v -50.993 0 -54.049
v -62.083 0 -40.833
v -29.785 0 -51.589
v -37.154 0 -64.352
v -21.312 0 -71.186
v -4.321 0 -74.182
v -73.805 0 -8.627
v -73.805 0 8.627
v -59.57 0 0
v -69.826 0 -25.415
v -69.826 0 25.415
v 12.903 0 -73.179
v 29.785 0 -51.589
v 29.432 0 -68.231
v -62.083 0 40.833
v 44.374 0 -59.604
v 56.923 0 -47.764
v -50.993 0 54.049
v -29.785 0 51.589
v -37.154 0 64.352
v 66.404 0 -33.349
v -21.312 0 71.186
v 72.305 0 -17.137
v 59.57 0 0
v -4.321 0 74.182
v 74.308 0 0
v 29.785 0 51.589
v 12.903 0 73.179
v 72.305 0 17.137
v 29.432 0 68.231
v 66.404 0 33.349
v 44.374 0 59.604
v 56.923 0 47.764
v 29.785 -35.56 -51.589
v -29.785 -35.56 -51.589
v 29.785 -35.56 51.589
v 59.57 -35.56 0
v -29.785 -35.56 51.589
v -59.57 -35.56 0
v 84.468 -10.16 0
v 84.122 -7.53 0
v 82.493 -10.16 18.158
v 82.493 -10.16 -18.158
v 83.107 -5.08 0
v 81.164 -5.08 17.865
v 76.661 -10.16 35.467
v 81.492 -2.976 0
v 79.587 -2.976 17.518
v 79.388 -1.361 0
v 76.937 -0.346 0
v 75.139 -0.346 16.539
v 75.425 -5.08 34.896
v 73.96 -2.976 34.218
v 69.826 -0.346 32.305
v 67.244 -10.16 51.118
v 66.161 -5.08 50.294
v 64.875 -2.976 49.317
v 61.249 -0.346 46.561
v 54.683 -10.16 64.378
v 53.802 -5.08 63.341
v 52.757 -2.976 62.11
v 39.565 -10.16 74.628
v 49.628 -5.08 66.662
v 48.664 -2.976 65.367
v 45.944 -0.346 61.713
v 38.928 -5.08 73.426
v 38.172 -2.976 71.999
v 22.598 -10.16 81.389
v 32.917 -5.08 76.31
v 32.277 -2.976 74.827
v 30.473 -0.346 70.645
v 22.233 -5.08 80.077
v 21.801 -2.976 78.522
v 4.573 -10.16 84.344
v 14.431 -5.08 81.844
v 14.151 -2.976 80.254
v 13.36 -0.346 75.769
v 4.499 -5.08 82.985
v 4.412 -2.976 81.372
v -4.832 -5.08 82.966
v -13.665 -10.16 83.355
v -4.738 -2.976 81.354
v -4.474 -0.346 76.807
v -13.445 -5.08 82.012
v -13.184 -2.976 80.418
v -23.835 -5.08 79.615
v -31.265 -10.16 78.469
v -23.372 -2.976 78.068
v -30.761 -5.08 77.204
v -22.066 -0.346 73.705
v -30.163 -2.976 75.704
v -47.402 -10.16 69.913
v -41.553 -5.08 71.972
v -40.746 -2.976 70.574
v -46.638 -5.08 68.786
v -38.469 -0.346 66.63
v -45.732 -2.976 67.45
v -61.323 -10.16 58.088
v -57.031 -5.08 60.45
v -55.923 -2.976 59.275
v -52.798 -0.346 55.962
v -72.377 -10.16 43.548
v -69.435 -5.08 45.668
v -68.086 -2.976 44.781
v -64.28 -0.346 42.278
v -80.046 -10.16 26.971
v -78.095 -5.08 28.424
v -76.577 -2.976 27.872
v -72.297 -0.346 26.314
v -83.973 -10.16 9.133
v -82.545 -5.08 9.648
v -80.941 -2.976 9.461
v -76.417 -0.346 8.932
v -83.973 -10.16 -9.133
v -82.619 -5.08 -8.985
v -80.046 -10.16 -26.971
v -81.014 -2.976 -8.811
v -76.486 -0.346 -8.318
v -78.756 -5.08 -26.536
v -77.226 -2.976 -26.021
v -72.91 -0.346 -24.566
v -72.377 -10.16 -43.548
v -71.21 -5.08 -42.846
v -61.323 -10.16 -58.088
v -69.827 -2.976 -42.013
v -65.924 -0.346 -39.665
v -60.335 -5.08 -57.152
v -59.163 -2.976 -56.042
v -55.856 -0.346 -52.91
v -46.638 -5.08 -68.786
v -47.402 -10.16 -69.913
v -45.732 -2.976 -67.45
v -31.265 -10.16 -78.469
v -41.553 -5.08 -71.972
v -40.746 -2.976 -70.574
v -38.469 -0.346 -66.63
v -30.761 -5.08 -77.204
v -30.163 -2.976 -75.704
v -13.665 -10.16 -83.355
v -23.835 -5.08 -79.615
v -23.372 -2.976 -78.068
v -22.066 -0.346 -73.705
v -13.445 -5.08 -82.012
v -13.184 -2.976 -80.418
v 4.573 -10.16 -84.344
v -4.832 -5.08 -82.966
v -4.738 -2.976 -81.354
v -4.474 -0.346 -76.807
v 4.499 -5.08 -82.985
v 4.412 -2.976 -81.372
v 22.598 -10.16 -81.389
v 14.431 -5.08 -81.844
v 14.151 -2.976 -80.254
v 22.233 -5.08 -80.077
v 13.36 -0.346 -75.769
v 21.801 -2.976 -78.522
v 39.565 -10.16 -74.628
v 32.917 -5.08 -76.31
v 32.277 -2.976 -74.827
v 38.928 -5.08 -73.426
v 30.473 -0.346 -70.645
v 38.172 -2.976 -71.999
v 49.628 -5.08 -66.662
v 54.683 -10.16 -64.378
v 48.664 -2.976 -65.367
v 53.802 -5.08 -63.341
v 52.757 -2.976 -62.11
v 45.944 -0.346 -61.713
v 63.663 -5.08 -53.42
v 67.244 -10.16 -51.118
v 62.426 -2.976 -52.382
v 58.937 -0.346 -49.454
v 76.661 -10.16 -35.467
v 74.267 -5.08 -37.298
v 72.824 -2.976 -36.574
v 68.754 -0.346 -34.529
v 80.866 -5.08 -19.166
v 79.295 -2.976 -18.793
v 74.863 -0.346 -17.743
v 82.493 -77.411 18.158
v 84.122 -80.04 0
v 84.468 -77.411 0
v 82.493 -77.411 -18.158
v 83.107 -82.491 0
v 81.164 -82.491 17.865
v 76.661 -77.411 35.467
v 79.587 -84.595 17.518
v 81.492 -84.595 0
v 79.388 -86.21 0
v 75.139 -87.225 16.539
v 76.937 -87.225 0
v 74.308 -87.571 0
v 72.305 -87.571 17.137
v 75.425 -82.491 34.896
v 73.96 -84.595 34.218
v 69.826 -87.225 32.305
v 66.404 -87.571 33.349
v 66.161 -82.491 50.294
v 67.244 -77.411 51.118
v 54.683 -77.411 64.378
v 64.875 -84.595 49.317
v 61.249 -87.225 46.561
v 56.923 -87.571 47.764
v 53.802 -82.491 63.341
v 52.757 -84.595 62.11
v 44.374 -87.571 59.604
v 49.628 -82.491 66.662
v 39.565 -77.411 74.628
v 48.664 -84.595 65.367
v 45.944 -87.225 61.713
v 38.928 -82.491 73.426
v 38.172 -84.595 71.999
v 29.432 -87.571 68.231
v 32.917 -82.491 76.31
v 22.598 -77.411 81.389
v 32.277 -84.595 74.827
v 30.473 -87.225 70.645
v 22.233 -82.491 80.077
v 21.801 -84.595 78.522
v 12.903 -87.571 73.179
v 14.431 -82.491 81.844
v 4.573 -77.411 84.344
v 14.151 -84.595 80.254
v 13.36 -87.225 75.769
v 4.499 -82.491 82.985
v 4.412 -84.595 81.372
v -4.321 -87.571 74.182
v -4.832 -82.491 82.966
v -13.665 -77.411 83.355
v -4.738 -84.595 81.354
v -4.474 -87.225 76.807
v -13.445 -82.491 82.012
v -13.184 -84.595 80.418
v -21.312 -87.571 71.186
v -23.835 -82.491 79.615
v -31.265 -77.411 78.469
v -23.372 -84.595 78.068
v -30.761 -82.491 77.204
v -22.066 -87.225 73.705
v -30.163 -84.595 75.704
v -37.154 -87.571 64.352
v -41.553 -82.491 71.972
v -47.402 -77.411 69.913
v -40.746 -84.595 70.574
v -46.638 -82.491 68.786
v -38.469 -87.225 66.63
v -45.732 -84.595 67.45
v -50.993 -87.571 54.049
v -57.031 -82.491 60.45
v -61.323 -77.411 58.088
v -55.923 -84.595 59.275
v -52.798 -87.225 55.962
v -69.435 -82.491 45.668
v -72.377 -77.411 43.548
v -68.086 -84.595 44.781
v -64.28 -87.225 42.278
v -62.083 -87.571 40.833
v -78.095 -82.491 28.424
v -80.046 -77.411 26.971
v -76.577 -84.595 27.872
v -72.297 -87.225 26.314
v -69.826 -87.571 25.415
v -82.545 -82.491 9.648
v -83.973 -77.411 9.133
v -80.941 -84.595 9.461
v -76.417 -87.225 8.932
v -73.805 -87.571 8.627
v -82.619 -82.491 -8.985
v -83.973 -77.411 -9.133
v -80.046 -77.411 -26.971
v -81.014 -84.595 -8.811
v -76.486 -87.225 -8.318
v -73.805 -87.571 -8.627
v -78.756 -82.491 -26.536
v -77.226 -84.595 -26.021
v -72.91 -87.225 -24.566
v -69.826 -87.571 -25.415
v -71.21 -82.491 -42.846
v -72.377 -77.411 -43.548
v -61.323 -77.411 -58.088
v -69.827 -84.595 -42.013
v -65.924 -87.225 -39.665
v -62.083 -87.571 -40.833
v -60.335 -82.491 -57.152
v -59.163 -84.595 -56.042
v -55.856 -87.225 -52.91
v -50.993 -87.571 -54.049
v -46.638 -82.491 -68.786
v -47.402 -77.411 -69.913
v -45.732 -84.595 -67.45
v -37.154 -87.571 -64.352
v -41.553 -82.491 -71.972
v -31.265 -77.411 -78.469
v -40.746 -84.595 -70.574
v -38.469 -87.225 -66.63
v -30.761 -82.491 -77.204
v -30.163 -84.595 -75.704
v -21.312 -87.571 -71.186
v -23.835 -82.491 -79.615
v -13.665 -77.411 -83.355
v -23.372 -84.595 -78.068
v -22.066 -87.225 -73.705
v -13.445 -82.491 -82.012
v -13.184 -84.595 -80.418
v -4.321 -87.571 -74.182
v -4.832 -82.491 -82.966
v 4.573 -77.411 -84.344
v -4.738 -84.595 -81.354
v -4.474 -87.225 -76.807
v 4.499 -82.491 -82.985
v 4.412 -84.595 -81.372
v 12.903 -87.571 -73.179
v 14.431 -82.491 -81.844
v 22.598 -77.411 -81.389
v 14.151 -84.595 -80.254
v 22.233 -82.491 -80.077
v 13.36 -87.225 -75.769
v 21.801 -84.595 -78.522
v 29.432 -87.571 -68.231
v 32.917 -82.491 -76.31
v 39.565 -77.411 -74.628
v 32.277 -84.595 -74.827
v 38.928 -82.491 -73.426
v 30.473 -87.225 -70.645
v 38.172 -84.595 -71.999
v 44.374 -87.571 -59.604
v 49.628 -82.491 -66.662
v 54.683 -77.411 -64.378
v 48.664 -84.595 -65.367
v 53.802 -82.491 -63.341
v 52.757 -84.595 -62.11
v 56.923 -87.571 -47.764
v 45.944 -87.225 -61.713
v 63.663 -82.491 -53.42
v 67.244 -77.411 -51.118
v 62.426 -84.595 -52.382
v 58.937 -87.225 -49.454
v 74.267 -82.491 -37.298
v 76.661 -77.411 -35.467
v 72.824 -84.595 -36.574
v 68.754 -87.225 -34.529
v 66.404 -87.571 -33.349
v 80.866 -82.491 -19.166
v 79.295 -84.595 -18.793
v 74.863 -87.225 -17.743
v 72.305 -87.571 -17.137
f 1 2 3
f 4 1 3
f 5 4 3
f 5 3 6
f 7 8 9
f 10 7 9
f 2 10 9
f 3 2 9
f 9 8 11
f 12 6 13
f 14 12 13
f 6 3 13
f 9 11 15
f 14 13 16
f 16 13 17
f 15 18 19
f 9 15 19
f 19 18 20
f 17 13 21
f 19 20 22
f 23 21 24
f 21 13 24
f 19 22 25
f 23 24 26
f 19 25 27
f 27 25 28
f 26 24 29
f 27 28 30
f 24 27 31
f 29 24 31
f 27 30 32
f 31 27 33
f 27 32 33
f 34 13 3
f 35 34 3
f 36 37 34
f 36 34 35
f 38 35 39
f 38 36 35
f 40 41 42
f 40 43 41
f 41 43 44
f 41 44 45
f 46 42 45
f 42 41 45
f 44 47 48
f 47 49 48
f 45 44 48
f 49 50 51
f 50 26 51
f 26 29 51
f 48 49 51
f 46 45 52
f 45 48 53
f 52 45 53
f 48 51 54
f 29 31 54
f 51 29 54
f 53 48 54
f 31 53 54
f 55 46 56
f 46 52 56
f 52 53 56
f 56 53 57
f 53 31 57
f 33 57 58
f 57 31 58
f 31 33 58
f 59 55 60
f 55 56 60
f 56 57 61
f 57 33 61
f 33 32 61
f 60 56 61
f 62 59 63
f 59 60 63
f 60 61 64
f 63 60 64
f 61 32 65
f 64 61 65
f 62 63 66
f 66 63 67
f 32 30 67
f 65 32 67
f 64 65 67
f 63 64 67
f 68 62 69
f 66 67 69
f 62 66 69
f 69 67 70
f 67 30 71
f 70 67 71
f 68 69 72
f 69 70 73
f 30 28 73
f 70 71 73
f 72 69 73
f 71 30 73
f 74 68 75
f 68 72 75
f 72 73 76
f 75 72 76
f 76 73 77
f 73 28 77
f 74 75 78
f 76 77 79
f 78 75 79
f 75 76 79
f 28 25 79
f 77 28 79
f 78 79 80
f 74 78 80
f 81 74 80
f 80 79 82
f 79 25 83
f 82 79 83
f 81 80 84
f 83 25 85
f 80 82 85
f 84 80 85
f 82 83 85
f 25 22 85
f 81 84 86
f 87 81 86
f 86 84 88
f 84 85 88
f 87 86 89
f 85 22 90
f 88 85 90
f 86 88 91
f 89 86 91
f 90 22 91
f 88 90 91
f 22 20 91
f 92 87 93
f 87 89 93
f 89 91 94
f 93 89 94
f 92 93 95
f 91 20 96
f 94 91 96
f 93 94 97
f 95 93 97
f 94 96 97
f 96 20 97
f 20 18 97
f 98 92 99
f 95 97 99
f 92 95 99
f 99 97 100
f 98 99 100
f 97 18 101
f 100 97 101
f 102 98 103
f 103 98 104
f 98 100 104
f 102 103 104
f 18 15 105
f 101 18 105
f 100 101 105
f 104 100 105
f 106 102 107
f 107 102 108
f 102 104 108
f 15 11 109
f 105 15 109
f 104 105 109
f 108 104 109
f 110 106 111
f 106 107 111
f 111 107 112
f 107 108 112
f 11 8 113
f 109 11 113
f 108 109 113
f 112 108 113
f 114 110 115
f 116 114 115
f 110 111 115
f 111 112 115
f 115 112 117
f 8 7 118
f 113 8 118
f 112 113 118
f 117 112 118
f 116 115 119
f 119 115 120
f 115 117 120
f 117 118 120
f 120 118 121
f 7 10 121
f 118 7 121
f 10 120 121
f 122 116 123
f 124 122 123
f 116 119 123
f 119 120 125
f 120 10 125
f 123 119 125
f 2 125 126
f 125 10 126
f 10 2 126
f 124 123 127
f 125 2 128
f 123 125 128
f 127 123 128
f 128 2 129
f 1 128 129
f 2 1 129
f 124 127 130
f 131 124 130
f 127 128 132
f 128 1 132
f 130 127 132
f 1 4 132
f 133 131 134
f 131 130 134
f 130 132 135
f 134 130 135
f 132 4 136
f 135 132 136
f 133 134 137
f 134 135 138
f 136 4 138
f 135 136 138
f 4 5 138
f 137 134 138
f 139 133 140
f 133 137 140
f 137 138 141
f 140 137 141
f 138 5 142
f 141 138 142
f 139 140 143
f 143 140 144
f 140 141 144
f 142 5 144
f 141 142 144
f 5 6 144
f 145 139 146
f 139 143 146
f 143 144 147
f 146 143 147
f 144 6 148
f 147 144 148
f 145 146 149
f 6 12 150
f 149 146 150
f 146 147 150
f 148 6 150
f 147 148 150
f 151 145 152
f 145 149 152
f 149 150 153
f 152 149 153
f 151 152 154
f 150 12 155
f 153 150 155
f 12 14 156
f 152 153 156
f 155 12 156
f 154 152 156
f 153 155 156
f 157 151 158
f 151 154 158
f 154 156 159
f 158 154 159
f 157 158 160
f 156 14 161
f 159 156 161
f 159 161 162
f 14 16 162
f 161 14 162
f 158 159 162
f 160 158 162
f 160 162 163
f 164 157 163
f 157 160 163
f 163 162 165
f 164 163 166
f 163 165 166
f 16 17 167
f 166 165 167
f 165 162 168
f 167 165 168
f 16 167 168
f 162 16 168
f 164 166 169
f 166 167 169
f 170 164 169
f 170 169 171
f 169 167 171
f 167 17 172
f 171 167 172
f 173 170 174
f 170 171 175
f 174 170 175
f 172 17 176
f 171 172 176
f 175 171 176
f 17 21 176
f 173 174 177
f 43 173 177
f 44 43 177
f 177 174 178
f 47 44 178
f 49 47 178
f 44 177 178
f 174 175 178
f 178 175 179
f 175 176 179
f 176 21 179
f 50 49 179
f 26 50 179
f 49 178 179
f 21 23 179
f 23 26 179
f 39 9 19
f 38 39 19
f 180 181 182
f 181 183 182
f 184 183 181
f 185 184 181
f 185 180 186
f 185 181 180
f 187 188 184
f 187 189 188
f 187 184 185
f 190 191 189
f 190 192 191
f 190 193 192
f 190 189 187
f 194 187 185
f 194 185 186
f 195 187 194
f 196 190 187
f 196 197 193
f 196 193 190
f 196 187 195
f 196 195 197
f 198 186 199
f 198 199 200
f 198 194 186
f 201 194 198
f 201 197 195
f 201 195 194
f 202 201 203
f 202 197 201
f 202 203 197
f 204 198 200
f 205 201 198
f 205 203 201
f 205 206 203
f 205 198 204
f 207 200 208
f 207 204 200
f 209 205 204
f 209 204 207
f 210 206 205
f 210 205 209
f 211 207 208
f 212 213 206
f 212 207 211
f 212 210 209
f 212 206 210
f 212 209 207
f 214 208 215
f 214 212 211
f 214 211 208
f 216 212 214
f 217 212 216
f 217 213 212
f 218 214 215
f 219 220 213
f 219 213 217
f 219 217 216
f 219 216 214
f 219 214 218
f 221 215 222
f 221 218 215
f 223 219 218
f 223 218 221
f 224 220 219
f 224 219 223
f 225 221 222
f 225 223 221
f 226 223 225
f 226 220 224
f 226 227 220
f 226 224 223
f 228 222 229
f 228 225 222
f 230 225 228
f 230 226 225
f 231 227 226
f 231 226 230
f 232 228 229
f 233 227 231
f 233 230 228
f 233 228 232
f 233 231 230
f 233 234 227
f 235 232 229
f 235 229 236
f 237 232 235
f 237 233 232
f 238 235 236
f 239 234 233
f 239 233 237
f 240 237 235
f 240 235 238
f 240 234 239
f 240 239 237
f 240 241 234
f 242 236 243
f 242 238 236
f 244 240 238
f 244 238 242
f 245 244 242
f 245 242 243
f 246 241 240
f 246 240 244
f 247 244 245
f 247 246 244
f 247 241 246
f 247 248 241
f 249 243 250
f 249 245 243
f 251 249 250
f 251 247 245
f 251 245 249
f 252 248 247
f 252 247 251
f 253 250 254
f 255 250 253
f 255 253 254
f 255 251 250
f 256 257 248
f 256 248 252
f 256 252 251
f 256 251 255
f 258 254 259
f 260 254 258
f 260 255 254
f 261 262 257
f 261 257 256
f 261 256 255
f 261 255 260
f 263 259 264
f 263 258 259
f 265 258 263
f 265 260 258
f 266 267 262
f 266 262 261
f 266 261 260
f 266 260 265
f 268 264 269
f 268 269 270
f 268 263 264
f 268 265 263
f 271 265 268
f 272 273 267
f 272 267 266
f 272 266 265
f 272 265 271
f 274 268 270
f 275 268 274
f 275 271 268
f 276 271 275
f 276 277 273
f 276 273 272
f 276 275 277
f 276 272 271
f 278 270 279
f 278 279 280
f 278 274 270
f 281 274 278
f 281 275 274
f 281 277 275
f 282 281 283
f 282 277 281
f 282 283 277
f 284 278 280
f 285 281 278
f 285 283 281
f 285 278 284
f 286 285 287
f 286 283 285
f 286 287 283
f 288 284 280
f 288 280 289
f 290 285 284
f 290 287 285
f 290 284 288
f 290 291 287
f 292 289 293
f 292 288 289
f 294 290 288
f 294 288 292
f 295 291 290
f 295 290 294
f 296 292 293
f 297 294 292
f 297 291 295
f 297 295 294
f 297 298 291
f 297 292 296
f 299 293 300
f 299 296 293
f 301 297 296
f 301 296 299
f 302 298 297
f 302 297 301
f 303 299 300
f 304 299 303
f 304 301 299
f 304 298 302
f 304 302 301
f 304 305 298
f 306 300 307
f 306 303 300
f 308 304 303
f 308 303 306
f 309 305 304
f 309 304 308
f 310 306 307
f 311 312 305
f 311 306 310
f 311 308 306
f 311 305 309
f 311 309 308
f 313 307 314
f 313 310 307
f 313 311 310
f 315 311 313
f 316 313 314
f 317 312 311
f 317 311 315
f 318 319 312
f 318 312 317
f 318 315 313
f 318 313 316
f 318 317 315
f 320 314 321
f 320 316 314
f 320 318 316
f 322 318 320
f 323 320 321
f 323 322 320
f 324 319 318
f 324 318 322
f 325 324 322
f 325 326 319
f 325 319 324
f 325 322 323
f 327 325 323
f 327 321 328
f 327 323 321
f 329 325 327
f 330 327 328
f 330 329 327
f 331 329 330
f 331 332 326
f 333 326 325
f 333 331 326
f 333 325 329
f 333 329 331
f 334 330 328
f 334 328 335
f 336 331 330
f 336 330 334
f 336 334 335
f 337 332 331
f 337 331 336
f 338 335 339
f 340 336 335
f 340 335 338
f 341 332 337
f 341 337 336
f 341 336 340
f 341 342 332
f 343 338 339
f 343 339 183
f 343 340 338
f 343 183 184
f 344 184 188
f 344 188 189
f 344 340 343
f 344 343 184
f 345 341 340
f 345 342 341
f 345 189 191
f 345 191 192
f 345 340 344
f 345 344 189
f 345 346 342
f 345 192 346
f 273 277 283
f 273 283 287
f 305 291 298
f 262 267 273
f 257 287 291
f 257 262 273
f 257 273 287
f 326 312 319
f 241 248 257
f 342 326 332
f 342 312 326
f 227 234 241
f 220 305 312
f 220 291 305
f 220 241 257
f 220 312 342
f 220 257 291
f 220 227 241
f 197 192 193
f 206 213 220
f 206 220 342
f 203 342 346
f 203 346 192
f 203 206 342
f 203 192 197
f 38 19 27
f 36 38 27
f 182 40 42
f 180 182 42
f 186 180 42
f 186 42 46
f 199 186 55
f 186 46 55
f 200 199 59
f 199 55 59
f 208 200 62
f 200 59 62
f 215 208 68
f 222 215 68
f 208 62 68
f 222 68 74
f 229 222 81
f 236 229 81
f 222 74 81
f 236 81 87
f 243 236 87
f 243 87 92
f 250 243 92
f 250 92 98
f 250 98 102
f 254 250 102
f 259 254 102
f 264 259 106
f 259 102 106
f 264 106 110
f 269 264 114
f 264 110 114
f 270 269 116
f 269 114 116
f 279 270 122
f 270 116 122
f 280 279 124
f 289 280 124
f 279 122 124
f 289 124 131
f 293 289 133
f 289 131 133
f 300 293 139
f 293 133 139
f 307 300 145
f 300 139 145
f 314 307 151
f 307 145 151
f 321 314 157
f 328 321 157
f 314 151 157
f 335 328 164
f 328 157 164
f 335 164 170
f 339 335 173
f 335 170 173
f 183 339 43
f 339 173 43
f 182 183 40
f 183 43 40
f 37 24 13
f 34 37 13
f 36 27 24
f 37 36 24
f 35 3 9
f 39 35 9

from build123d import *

# Parameters (mm, degrees)
F0_R     = 84.46775
F1_DEPTH = 87.570764
F2_R     = 10.16
F4_DEPTH = 35.56


with BuildPart() as f1:
    # F0 (on Front) → F1 (new body)
    with BuildSketch(Plane.XZ):
        Circle(F0_R)
    extrude(amount=F1_DEPTH)

    # F2
    f2_edges = [f1.edges().sort_by_distance(p)[0] for p in [
        (-84.46775, -87.570764, 0),
        (-84.46775, 0, 0),
    ]]
    fillet(f2_edges, radius=F2_R)

    # F3 (on face) → F4 (cut)
    with BuildSketch(Plane(origin=(0, 0, 0), x_dir=(-1, 0, 0), z_dir=(0, 1, 0))):
        Polygon((29.785042, 51.589206), (-29.785042, 51.589206), (-59.570084, 0), (-29.785042, -51.589206), (29.785042, -51.589206), (59.570084, 0), align=None)
    extrude(amount=-F4_DEPTH, mode=Mode.SUBTRACT)


solid = f1.part
